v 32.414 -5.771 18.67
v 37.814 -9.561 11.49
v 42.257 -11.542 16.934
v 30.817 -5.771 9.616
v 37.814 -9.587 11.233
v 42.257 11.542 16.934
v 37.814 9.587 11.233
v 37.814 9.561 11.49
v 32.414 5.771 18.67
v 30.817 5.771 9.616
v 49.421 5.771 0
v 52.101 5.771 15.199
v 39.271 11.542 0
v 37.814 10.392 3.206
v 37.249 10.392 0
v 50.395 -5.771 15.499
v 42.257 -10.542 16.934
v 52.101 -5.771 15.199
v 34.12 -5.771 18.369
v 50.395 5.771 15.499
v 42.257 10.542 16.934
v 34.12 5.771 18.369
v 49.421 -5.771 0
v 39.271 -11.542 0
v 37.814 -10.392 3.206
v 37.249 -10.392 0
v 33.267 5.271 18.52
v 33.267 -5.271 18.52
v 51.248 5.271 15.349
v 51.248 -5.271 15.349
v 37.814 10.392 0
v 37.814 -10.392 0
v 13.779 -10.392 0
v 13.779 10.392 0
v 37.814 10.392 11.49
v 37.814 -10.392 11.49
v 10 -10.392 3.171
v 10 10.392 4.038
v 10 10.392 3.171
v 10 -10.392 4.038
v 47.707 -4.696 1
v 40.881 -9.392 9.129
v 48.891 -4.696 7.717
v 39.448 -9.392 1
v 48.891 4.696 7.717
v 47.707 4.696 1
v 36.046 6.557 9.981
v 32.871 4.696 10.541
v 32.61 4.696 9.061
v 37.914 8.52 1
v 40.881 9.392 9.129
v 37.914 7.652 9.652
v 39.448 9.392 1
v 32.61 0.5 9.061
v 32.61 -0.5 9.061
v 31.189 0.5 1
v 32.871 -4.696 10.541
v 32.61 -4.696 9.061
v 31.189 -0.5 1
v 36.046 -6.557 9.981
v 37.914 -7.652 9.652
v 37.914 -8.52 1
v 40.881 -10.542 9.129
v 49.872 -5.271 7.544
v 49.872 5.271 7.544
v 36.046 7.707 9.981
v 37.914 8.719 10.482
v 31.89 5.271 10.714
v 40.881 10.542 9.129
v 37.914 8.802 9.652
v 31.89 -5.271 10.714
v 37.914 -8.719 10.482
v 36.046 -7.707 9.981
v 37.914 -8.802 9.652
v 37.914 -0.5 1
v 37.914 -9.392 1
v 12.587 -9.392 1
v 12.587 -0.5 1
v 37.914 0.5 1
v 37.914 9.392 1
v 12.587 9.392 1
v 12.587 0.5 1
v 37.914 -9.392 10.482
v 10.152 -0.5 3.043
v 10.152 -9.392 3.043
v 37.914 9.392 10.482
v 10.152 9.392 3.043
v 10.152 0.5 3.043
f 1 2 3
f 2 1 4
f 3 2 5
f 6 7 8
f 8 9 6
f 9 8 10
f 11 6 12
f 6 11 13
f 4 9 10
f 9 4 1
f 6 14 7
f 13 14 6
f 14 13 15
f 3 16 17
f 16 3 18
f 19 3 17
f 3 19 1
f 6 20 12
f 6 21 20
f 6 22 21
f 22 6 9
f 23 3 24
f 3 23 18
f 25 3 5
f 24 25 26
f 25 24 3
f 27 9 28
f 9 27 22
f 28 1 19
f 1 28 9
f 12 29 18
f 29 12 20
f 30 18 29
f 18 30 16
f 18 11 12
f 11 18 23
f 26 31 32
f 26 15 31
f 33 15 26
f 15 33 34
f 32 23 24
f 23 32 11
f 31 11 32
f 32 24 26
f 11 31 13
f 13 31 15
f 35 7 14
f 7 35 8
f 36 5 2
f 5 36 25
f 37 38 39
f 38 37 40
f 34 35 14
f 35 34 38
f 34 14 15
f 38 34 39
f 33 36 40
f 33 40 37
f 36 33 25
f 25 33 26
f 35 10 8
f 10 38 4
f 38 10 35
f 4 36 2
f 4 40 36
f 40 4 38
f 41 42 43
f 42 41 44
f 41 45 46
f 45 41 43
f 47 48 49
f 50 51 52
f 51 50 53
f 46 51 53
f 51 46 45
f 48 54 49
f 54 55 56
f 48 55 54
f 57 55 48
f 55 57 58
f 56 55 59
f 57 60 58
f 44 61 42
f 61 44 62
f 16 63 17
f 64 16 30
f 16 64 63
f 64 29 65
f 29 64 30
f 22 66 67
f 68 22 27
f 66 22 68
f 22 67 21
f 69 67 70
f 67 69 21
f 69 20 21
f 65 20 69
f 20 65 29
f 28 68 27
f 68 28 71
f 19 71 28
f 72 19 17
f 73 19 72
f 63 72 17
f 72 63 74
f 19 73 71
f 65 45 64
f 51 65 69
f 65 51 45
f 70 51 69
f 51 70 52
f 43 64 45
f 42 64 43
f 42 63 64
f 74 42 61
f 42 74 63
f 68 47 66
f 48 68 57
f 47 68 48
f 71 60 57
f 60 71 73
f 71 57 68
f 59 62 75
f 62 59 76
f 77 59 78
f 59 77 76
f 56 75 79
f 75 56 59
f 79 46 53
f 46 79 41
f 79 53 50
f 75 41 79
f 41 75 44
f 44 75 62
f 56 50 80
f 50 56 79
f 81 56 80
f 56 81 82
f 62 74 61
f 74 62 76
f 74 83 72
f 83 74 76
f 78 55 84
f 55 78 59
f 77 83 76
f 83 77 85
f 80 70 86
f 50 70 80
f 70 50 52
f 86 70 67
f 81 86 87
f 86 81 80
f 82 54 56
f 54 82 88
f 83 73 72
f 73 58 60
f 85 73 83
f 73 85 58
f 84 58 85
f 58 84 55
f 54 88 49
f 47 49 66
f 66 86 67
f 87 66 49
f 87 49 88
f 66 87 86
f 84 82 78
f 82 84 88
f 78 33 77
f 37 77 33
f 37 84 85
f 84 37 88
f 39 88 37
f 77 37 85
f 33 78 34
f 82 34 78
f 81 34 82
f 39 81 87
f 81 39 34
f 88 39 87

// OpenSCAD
//
// Universal fan duct system for G2s spiders
//
// Copyright (C) 2015, Jason S. McMullan <jason.mcmullan@gmail.com>
// All right reserved.
//
// Licensed under the MIT License:
//
// Permission is hereby granted, free of charge, to any person obtaining
// a copy of this software and associated documentation files (the "Software"),
// to deal in the Software without restriction, including without limitation
// the rights to use, copy, modify, merge, publish, distribute, sublicense,
// and/or sell copies of the Software, and to permit persons to whom the
// Software is furnished to do so, subject to the following conditions:
//
// The above copyright notice and this permission notice shall be included
// in all copies or substantial portions of the Software.
//
// THE SOFTWARE IS PROVIDED "AS IS", WITHOUT WARRANTY OF ANY KIND, EXPRESS OR
// IMPLIED, INCLUDING BUT NOT LIMITED TO THE WARRANTIES OF MERCHANTABILITY,
// FITNESS FOR A PARTICULAR PURPOSE AND NONINFRINGEMENT. IN NO EVENT SHALL THE
// AUTHORS OR COPYRIGHT HOLDERS BE LIABLE FOR ANY CLAIM, DAMAGES OR OTHER
// LIABILITY, WHETHER IN AN ACTION OF CONTRACT, TORT OR OTHERWISE, ARISING
// FROM, OUT OF OR IN CONNECTION WITH THE SOFTWARE OR THE USE OR OTHER
// DEALINGS IN THE SOFTWARE.
//
// All units are in mm

// Distance between J-heads
head_gap = 0;	// 0,20,26,30

// Clearance from bed to probe and fan
bed_clearance = 2;

// height of the inlet pipe
height = 80;


// Optimize part for quickest printing - use an integer multiple of the printer's nozzle size
wall_width = 1;    // Wall thickness - should be a multiple of machine_nozzle;

// Size of the output of the blower
blower_out= [16.3, 25.5, 3];

neck_width = 20; // Distance between head bolts for the neck


duct_z = 36; // Height from base to next
duct_height = duct_z;

// Distance from nozzle to probe mount frame
probe_mount = 28;

blower_shift_extra = 10;

neck_height = 35;

// Slope of the foot
foot_slope = 10;

tolerance = 0.15;

// Calculated parameters

neck_size = [blower_out[0]+2*wall_width, neck_width];
duct_slice = 0.1;
joint_tolerance = tolerance;
clip_tolerance = tolerance * 4;


blower_volume = blower_out[0]*blower_out[1]/2;
out_depth = sqrt(blower_volume/PI)*2/sqrt(3);

// Thickness of the outflow
ring_height = blower_volume/(out_depth*2)/1.25;

$fn = 24;

module universal_fan_duct_blower_adapter_fab(size = blower_out, carve = false)
{
    height = out_depth;
    if (!carve) {
       translate([wall_width, wall_width, 0])
            cube([size[0], size[1], height+size[2]]);
        cube([size[0]+2*wall_width, size[1]+wall_width, height]);
        translate([size[0]/2 + wall_width, size[1]+wall_width, 0])
            rotate([90, 0, 0]) cylinder(r = out_depth + wall_width - tolerance, h = size[1] + 10, $fn = 6);
    } else {            
        translate([wall_width*2, wall_width*2, -0.1])
          cube([size[0]-2*wall_width, size[1]-2*wall_width, height+size[2]+0.2]);
        translate([size[0]/2 + wall_width, size[1], 0])
            rotate([90, 0, 0]) cylinder(r = out_depth, h = size[1] + 10 + 0.1, $fn = 6);
        
    }
}

module universal_fan_duct_blower_adapter(size = blower_out)
{
    difference() {
        universal_fan_duct_blower_adapter_fab(size = size, carve = false);
        universal_fan_duct_blower_adapter_fab(size = size, carve = true);
    }

    if (false) {
    	% translate([-wall_width, 18-wall_width, out_depth+20])
        rotate([-90, 180, -90]) blower();
    }
}

module universal_fan_duct_outflow(height = height, head_gap = head_gap, slope = foot_slope, carve = false)
{
    airgap = 10;
    
    angle = atan(head_gap / 2 / (probe_mount + out_depth));
    vent_len = (probe_mount + out_depth - airgap) / cos(angle) / cos(slope);
    vent_width = out_depth*(head_gap > 0 ? 1.5 : 2) + wall_width*2;
    vent_height = blower_volume / (out_depth*sqrt(3));

    translate([airgap, 0, 0]) {
	    difference() {
		rotate([0, 0, -angle]) {
	 
		    
		    // Connector to nozzle
		    translate([0, -vent_width/2, 0]) {
			if (!carve) {
			  cube([vent_len, vent_width, vent_height]);
			} else {
			  translate([-0.1, wall_width, wall_width])
				cube([vent_len + 0.2, (vent_width-3*wall_width)/2, vent_height - wall_width*2]);
			  translate([-0.1, wall_width + (vent_width-2*wall_width + wall_width)/2, wall_width])
				cube([vent_len + 0.2, (vent_width-3*wall_width)/2, vent_height - wall_width*2]);
		       }
		    }
		}
		
		rotate([0, -15, -angle]) if (!carve) {
		    translate([0, -vent_width/2 - wall_width, wall_width*4 - 0.1]) cube([vent_len*2, vent_width + wall_width*2, vent_height*2 + 0.2]);
		} else {
		    translate([0, -vent_width/2 - wall_width - 0.1, wall_width*3 -0.1]) cube([vent_len*2, vent_width + wall_width*2 + 0.2, vent_height*2 + 0.2]);
		}
	    }
	    
	     // Exit ducting & fan mount
	     if (carve)
		rotate([0, 0, -angle]) translate([-wall_width*4, -vent_width/2 - 0.1, 0])
		     rotate([0, -50, 0]) translate([0, 0, -wall_width*8])
		     cube([wall_width*5, vent_width + 0.2, vent_height]);
    }
	    
}

module universal_fan_duct_pipe_fab(height = height, carve = false)
{
    if (!carve) {
      rotate([0, 0, 30]) cylinder(r = out_depth+wall_width, h = height, $fn = 6);
    } else {
      translate([0, 0, -0.1]) rotate([0, 0, 30]) cylinder(r = out_depth, h = height + 0.2, $fn = 6);
    }
}

module universal_fan_duct_pipe(height = height)
{
    difference() {
        universal_fan_duct_pipe_fab(height = height, carve = false);
        universal_fan_duct_pipe_fab(height = height, carve = true);
    }
}

module universal_fan_duct_pipe_connector_fab(height = 10, carve = false, bottom = false)
{
    blower_ro = out_depth + wall_width;
    
    if (!carve) {
        rotate([0, 0, 30]) cylinder(r = blower_ro + wall_width + joint_tolerance, h = height, $fn = 6);
    } else {
        if (bottom) {
           translate([0, 0, wall_width]) rotate([0, 0, 30]) {
                cylinder(r = blower_ro - wall_width, h = height + 0.1, $fn = 6);
            }
            translate([0, 0, height/2 + wall_width*1.5]) rotate([0, 0, 30])
                cylinder(r = blower_ro + joint_tolerance, h = height/2 + 0.1 - wall_width/2, $fn = 6);
        } else {
            translate([0, 0, -0.1]) rotate([0, 0, 30]) {
                cylinder(r = blower_ro + joint_tolerance, h = height/2 + 0.1 - wall_width/2, $fn = 6);
                cylinder(r = blower_ro - wall_width, h = height + 0.2, $fn = 6);
            }
            translate([0, 0, height/2 + wall_width/2]) rotate([0, 0, 30]) cylinder(r = blower_ro + joint_tolerance, h = height/2 + 0.1 - wall_width/2, $fn = 6);
        }
    }
}

module universal_fan_duct_pipe_connector(height = 10)
{
    difference() {
        universal_fan_duct_pipe_connector_fab(height = height, carve = false);
        universal_fan_duct_pipe_connector_fab(height = height, carve = true);
    }
}

module universal_fan_duct_foot_fab(height = height, slope = foot_slope, head_gap = head_gap, carve = false)
{
    blower_ro = (out_depth + wall_width) * 2/sqrt(3);
    
    translate([(probe_mount + out_depth + wall_width)/cos(slope), 0, 0])
    difference() {
        translate([0, 0, -sin(slope)*out_depth])
       rotate([0, slope, 0])
            universal_fan_duct_pipe_connector_fab(height = 10 + ring_height, bottom = true, carve = carve);
        if (!carve) {
            translate([-blower_ro*cos(slope), -blower_ro*cos(slope), -2*sin(slope)*blower_ro]) cube([2*blower_ro*cos(slope), 2*blower_ro*cos(slope), 2*blower_ro*sin(slope)]);
        } else {
            translate([-blower_ro*cos(slope), -blower_ro*cos(slope), 0]) cube([2*blower_ro*cos(slope), 2*blower_ro*cos(slope), wall_width]);
        }
            
    }
  translate([0, head_gap/2, 0]) universal_fan_duct_outflow(height = height, slope = slope, head_gap = head_gap, carve = carve);
  if (head_gap > 0)
      mirror([0, 1, 0]) 
        translate([0, head_gap/2, 0]) universal_fan_duct_outflow(height = height, slope = slope, head_gap = head_gap, carve = carve);
}

module universal_fan_duct_foot(height = 80, bed_clearance = bed_clearance, head_gap = head_gap, slope = foot_slope)
{
    difference() {
        universal_fan_duct_foot_fab(height = height, slope = slope, head_gap = head_gap, carve = false);
        universal_fan_duct_foot_fab(height = height, slope = slope, head_gap = head_gap, carve = true);
        // Uncomment to debug cross section of duct
        // translate([-10, -wall_width, -0.1]) cube([100, 100, 100]);
    }
}

module universal_fan_duct_foot_single(slope = foot_slope)
{
	universal_fan_duct_foot(head_gap = 0, slope = slope);
}

universal_fan_duct_foot_single();

module universal_fan_duct_foot_g2s(slope = foot_slope)
{
	universal_fan_duct_foot(head_gap = 20, slope = slope);
}

module universal_fan_duct_foot_g2s_pro(slope = foot_slope)
{
	universal_fan_duct_foot(head_gap = 26, slope = slope);
}

module universal_fan_duct_foot_e3d_x2(slope = foot_slope)
{
	universal_fan_duct_foot(head_gap = 30, slope = slope);
}

module universal_fan_duct_tubing_connector(tubing_id)
{
     translate([probe_mount + out_depth +wall_width, 0, 0]) rotate([0, 0, 30]) difference() {
        union() {
                cylinder(r = out_depth+wall_width*2, h = 10, $fn = 6);
            translate([0, 0, 10])
                cylinder(r1 = out_depth+wall_width*2, r2 = tubing_id/2, h=10);
            translate([0, 0, 20])
                cylinder(r = tubing_id/2, h = 10);
        }
        translate([0, 0, -0.1]) {
            cylinder(r = out_depth+wall_width+tolerance, h = 10 + 0.2, $fn = 6);
            translate([0, 0, 10])
                cylinder(r1 = out_depth, r2 = tubing_id/2 - wall_width, h = 10 + 0.1);
            translate([0, 0, 20])
                cylinder(r = tubing_id/2 - wall_width, h = 10+0.2);
        }
    }
}

module universal_fan_duct_22mm_connector()
{
	universal_fan_duct_tubing_connector(tubing_id = 22);
}

module universal_fan_duct_clip_fab(carve = false, height = 8)
{
    size = [7, 8, 3];
    
    blower_ro = out_depth + wall_width;
    
    translate([probe_mount + blower_ro, 0, 0]) {
        if (!carve) {
            rotate([0, 0, 30]) cylinder(r = blower_ro + clip_tolerance + wall_width, h = height, $fn = 6);
            translate([-blower_ro - wall_width - size[0], -size[1]/2, 0]) cube([size[0] + blower_ro, size[1], size[2]]);
        } else {
            translate([0, 0, -0.1]) rotate([0, 0, 30]) cylinder(r = blower_ro + clip_tolerance, h = height + 0.2, $fn = 6);
            translate([-blower_ro - 3, 0, -0.1]) {
                cylinder(d = 4, h = size[2] + 0.2, $fn = 30);
                translate([0, 0, size[2]/2]) cylinder(r = 5.5/sqrt(3), h = size[2]/2 + 0.2, $fn = 6);
            }
        }
    }   
}

module universal_fan_duct_clip()
{
    difference() {
        universal_fan_duct_clip_fab(carve = false);
        universal_fan_duct_clip_fab(carve = true);
    }
}

if (false) {
% universal_fan_duct_clip();
% translate([20, 22, 0])
    universal_fan_duct_22mm_connector();
% translate([10, 30, 0]) rotate([0, 0, -90]) 
    universal_fan_duct_foot_e3d_x2();
translate([-26, -7, 0]) rotate([0, 0, 90]) 
    universal_fan_duct_foot_single();
% translate([45, 0, 27]) rotate([-90, 0, 0])
    universal_fan_duct_blower_adapter();
}
